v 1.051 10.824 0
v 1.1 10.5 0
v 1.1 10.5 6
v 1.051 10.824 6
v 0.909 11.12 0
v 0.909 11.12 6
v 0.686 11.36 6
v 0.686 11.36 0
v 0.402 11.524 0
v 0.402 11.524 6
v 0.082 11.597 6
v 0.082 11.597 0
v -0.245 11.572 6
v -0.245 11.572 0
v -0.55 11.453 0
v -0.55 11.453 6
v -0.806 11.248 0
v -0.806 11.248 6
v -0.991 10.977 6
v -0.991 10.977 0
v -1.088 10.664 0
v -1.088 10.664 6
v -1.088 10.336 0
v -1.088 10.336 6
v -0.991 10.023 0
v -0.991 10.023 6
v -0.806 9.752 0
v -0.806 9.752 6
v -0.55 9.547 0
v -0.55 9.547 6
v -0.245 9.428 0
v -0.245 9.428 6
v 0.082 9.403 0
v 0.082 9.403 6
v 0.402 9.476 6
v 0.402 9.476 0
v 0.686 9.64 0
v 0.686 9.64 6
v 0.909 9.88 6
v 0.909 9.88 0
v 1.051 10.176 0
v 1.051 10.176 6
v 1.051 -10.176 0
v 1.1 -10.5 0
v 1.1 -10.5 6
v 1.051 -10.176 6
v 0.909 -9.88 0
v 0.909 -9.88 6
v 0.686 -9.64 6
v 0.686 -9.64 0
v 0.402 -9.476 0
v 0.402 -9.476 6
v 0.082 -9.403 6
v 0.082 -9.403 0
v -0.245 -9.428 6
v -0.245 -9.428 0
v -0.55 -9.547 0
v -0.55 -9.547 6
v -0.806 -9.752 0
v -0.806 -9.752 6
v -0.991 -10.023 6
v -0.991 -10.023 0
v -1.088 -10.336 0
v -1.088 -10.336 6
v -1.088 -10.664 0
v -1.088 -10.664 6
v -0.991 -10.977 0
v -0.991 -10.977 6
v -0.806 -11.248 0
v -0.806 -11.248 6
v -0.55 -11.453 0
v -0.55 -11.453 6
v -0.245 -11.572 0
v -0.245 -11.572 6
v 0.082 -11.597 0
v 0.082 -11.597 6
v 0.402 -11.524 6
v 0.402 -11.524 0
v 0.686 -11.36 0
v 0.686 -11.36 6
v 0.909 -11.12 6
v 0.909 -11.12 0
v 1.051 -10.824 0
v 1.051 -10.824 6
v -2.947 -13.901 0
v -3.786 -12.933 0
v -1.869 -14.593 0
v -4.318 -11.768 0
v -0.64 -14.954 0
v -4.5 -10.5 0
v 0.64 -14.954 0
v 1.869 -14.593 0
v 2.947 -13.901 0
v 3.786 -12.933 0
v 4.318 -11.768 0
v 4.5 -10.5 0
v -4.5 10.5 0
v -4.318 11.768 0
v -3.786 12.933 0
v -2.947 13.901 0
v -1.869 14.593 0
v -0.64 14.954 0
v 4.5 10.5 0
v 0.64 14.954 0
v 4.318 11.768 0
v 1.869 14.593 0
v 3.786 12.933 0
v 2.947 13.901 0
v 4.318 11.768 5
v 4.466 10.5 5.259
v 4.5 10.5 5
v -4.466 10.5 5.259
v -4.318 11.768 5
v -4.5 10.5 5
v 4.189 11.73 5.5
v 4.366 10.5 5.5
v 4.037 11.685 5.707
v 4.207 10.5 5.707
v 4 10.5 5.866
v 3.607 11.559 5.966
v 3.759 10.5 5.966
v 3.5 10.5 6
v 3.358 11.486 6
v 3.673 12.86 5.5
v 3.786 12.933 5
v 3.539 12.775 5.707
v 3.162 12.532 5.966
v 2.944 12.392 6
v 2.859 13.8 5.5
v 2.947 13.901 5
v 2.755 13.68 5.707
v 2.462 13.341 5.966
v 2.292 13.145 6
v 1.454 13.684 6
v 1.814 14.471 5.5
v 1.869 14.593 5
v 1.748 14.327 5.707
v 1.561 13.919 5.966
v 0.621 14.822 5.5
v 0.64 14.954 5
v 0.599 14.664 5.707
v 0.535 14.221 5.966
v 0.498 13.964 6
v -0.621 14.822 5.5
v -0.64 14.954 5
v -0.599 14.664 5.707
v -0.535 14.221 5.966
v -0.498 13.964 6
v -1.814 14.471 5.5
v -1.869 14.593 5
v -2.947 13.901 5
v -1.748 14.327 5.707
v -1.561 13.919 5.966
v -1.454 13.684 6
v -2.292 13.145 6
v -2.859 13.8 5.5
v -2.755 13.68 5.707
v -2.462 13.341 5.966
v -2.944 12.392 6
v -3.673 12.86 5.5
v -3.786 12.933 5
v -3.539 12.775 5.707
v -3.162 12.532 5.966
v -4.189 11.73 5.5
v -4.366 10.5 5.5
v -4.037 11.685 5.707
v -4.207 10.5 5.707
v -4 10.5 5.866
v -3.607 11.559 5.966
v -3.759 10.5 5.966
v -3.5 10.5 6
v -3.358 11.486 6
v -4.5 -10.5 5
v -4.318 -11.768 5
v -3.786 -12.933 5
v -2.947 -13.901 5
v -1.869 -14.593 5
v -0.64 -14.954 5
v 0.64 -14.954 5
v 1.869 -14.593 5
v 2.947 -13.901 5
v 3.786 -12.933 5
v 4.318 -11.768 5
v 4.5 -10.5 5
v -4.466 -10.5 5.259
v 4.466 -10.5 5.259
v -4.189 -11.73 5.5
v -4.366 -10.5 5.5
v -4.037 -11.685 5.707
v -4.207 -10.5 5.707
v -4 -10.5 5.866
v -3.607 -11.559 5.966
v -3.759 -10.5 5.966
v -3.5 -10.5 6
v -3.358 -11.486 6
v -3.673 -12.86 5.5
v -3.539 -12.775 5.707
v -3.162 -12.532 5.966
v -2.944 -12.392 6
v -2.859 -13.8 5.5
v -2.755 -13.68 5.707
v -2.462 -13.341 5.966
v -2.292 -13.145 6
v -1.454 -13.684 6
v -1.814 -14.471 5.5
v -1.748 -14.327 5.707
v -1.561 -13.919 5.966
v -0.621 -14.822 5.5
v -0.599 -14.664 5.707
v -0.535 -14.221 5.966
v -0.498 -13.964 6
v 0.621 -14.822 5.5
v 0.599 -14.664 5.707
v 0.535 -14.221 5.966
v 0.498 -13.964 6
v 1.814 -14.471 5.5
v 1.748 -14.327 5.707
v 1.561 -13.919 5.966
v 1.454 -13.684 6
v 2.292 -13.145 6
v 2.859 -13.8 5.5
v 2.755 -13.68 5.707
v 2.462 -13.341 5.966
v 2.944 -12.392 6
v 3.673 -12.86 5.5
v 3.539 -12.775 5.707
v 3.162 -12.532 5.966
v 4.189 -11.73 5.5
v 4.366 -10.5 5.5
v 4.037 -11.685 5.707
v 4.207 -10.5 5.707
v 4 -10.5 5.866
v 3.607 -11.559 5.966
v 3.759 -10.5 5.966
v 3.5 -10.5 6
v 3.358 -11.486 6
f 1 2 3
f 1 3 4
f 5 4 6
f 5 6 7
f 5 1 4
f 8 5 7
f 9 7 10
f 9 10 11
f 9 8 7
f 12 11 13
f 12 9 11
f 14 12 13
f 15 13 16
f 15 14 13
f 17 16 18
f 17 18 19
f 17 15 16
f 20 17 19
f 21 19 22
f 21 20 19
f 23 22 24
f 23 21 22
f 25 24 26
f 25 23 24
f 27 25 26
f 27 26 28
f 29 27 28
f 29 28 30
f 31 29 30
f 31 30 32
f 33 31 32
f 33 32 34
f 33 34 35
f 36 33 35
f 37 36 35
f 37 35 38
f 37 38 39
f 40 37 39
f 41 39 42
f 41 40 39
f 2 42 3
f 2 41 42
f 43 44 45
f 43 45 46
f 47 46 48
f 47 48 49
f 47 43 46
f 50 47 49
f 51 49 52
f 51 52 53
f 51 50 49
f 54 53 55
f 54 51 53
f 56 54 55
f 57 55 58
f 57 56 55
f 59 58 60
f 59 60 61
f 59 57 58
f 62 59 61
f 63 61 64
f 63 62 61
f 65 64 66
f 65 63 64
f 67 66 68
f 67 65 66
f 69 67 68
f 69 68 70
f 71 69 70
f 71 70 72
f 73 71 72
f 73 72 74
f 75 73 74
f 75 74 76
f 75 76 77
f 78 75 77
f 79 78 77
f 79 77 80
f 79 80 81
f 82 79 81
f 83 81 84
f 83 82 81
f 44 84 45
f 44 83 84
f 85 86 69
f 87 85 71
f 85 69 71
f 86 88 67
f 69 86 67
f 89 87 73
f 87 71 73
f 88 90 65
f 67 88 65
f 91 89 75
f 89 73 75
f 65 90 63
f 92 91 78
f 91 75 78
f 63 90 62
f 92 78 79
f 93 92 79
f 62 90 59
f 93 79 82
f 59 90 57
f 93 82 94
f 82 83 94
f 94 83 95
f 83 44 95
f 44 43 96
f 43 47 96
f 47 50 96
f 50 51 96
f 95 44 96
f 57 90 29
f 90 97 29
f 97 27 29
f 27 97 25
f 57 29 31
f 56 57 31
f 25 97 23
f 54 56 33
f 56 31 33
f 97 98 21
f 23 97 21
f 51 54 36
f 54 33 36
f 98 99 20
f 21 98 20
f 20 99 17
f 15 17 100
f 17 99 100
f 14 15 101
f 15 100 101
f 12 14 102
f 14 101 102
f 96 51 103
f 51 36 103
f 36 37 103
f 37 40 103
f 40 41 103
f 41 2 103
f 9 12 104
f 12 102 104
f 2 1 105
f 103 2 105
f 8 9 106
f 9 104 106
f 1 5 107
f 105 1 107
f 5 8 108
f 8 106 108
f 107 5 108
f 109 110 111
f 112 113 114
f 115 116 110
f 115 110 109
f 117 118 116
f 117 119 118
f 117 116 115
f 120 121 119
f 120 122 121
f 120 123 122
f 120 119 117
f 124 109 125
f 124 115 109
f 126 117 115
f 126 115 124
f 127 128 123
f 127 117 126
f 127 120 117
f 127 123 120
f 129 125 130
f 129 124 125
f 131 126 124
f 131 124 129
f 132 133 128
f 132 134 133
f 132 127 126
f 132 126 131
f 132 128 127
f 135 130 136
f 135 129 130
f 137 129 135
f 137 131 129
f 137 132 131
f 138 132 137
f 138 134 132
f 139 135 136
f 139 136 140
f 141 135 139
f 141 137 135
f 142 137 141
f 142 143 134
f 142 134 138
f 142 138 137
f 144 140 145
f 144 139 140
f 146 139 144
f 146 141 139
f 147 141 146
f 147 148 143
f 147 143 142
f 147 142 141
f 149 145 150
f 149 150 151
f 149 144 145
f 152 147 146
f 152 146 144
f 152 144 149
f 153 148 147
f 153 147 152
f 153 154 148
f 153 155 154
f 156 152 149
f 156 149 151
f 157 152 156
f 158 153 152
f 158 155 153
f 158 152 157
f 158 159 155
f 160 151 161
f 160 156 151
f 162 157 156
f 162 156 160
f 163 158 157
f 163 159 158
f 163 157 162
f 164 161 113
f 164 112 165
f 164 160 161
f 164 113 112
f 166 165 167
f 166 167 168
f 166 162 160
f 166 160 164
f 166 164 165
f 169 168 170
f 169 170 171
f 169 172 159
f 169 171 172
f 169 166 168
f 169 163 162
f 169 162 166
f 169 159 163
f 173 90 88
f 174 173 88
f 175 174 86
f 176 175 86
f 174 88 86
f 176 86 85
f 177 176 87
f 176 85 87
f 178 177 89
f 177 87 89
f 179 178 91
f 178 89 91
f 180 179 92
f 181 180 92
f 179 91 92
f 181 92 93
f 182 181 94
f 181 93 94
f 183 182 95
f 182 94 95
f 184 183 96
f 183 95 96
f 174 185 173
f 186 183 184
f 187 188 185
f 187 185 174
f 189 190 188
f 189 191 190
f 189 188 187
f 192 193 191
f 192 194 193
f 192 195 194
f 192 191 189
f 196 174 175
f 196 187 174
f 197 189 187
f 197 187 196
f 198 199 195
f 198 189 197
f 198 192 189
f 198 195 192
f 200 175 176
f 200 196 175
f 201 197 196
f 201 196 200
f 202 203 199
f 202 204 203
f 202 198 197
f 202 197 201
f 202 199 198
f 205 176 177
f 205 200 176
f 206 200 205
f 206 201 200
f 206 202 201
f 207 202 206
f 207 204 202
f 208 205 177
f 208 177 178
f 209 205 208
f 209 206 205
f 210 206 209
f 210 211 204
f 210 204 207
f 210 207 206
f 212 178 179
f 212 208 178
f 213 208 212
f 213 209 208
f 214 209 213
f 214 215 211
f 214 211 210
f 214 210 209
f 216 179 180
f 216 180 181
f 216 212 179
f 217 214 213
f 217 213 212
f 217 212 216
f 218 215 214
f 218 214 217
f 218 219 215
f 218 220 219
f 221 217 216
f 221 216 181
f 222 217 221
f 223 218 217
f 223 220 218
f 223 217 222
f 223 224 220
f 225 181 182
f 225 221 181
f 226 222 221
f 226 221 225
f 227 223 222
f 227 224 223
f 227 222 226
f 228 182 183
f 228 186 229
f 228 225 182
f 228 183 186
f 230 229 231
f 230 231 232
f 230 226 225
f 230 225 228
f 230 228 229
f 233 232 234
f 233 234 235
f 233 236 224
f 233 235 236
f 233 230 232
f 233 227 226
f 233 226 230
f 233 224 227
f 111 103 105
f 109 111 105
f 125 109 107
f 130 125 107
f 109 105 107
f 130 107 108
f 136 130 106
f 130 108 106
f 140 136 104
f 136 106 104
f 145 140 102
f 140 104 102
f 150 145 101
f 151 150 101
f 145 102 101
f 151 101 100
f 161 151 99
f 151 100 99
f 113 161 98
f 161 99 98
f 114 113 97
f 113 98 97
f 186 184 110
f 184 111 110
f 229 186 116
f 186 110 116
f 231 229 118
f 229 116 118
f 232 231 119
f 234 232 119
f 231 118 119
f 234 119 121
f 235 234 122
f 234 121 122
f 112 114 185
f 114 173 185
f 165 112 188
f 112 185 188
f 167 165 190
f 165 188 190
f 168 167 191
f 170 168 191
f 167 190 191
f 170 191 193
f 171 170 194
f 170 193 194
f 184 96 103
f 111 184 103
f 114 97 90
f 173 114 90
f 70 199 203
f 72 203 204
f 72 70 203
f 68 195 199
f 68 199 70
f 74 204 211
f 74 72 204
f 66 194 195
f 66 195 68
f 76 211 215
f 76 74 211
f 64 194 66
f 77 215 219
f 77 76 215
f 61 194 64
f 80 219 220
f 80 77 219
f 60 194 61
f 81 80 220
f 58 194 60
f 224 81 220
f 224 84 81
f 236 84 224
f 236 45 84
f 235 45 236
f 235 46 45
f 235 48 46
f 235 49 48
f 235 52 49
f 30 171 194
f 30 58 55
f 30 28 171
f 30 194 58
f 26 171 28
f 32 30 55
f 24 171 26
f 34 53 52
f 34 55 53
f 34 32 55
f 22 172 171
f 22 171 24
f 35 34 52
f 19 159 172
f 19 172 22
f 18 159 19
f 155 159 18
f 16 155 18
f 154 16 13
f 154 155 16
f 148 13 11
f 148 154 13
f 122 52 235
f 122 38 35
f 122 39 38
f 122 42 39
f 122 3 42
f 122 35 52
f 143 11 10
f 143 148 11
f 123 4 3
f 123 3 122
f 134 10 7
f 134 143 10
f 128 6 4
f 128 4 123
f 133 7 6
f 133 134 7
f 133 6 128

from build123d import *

# Parameters (mm, degrees)
SKETCH_R  = 1.1
PAD_DEPTH = 6
FILLET_R  = 1


with BuildPart() as part:
    # Sketch → Pad (new body)
    with BuildSketch(Plane.XY):
        with BuildLine():
            ThreePointArc((4.5, 10.5), (0, 15), (-4.5, 10.5))
            Line((-4.5, 10.5), (-4.5, -10.5))
            ThreePointArc((-4.5, -10.5), (0, -15), (4.5, -10.5))
            Line((4.5, -10.5), (4.5, 10.5))
        make_face()
        with Locations((0, 10.5)):
            Circle(SKETCH_R, mode=Mode.SUBTRACT)
        with Locations((0, -10.5)):
            Circle(SKETCH_R, mode=Mode.SUBTRACT)
    extrude(amount=PAD_DEPTH)

    # Fillet
    fillet_edges = [part.edges().sort_by_distance(p)[0] for p in [
        (-4.5, 0, 6),
    ]]
    fillet(fillet_edges, radius=FILLET_R)


solid = part.part
